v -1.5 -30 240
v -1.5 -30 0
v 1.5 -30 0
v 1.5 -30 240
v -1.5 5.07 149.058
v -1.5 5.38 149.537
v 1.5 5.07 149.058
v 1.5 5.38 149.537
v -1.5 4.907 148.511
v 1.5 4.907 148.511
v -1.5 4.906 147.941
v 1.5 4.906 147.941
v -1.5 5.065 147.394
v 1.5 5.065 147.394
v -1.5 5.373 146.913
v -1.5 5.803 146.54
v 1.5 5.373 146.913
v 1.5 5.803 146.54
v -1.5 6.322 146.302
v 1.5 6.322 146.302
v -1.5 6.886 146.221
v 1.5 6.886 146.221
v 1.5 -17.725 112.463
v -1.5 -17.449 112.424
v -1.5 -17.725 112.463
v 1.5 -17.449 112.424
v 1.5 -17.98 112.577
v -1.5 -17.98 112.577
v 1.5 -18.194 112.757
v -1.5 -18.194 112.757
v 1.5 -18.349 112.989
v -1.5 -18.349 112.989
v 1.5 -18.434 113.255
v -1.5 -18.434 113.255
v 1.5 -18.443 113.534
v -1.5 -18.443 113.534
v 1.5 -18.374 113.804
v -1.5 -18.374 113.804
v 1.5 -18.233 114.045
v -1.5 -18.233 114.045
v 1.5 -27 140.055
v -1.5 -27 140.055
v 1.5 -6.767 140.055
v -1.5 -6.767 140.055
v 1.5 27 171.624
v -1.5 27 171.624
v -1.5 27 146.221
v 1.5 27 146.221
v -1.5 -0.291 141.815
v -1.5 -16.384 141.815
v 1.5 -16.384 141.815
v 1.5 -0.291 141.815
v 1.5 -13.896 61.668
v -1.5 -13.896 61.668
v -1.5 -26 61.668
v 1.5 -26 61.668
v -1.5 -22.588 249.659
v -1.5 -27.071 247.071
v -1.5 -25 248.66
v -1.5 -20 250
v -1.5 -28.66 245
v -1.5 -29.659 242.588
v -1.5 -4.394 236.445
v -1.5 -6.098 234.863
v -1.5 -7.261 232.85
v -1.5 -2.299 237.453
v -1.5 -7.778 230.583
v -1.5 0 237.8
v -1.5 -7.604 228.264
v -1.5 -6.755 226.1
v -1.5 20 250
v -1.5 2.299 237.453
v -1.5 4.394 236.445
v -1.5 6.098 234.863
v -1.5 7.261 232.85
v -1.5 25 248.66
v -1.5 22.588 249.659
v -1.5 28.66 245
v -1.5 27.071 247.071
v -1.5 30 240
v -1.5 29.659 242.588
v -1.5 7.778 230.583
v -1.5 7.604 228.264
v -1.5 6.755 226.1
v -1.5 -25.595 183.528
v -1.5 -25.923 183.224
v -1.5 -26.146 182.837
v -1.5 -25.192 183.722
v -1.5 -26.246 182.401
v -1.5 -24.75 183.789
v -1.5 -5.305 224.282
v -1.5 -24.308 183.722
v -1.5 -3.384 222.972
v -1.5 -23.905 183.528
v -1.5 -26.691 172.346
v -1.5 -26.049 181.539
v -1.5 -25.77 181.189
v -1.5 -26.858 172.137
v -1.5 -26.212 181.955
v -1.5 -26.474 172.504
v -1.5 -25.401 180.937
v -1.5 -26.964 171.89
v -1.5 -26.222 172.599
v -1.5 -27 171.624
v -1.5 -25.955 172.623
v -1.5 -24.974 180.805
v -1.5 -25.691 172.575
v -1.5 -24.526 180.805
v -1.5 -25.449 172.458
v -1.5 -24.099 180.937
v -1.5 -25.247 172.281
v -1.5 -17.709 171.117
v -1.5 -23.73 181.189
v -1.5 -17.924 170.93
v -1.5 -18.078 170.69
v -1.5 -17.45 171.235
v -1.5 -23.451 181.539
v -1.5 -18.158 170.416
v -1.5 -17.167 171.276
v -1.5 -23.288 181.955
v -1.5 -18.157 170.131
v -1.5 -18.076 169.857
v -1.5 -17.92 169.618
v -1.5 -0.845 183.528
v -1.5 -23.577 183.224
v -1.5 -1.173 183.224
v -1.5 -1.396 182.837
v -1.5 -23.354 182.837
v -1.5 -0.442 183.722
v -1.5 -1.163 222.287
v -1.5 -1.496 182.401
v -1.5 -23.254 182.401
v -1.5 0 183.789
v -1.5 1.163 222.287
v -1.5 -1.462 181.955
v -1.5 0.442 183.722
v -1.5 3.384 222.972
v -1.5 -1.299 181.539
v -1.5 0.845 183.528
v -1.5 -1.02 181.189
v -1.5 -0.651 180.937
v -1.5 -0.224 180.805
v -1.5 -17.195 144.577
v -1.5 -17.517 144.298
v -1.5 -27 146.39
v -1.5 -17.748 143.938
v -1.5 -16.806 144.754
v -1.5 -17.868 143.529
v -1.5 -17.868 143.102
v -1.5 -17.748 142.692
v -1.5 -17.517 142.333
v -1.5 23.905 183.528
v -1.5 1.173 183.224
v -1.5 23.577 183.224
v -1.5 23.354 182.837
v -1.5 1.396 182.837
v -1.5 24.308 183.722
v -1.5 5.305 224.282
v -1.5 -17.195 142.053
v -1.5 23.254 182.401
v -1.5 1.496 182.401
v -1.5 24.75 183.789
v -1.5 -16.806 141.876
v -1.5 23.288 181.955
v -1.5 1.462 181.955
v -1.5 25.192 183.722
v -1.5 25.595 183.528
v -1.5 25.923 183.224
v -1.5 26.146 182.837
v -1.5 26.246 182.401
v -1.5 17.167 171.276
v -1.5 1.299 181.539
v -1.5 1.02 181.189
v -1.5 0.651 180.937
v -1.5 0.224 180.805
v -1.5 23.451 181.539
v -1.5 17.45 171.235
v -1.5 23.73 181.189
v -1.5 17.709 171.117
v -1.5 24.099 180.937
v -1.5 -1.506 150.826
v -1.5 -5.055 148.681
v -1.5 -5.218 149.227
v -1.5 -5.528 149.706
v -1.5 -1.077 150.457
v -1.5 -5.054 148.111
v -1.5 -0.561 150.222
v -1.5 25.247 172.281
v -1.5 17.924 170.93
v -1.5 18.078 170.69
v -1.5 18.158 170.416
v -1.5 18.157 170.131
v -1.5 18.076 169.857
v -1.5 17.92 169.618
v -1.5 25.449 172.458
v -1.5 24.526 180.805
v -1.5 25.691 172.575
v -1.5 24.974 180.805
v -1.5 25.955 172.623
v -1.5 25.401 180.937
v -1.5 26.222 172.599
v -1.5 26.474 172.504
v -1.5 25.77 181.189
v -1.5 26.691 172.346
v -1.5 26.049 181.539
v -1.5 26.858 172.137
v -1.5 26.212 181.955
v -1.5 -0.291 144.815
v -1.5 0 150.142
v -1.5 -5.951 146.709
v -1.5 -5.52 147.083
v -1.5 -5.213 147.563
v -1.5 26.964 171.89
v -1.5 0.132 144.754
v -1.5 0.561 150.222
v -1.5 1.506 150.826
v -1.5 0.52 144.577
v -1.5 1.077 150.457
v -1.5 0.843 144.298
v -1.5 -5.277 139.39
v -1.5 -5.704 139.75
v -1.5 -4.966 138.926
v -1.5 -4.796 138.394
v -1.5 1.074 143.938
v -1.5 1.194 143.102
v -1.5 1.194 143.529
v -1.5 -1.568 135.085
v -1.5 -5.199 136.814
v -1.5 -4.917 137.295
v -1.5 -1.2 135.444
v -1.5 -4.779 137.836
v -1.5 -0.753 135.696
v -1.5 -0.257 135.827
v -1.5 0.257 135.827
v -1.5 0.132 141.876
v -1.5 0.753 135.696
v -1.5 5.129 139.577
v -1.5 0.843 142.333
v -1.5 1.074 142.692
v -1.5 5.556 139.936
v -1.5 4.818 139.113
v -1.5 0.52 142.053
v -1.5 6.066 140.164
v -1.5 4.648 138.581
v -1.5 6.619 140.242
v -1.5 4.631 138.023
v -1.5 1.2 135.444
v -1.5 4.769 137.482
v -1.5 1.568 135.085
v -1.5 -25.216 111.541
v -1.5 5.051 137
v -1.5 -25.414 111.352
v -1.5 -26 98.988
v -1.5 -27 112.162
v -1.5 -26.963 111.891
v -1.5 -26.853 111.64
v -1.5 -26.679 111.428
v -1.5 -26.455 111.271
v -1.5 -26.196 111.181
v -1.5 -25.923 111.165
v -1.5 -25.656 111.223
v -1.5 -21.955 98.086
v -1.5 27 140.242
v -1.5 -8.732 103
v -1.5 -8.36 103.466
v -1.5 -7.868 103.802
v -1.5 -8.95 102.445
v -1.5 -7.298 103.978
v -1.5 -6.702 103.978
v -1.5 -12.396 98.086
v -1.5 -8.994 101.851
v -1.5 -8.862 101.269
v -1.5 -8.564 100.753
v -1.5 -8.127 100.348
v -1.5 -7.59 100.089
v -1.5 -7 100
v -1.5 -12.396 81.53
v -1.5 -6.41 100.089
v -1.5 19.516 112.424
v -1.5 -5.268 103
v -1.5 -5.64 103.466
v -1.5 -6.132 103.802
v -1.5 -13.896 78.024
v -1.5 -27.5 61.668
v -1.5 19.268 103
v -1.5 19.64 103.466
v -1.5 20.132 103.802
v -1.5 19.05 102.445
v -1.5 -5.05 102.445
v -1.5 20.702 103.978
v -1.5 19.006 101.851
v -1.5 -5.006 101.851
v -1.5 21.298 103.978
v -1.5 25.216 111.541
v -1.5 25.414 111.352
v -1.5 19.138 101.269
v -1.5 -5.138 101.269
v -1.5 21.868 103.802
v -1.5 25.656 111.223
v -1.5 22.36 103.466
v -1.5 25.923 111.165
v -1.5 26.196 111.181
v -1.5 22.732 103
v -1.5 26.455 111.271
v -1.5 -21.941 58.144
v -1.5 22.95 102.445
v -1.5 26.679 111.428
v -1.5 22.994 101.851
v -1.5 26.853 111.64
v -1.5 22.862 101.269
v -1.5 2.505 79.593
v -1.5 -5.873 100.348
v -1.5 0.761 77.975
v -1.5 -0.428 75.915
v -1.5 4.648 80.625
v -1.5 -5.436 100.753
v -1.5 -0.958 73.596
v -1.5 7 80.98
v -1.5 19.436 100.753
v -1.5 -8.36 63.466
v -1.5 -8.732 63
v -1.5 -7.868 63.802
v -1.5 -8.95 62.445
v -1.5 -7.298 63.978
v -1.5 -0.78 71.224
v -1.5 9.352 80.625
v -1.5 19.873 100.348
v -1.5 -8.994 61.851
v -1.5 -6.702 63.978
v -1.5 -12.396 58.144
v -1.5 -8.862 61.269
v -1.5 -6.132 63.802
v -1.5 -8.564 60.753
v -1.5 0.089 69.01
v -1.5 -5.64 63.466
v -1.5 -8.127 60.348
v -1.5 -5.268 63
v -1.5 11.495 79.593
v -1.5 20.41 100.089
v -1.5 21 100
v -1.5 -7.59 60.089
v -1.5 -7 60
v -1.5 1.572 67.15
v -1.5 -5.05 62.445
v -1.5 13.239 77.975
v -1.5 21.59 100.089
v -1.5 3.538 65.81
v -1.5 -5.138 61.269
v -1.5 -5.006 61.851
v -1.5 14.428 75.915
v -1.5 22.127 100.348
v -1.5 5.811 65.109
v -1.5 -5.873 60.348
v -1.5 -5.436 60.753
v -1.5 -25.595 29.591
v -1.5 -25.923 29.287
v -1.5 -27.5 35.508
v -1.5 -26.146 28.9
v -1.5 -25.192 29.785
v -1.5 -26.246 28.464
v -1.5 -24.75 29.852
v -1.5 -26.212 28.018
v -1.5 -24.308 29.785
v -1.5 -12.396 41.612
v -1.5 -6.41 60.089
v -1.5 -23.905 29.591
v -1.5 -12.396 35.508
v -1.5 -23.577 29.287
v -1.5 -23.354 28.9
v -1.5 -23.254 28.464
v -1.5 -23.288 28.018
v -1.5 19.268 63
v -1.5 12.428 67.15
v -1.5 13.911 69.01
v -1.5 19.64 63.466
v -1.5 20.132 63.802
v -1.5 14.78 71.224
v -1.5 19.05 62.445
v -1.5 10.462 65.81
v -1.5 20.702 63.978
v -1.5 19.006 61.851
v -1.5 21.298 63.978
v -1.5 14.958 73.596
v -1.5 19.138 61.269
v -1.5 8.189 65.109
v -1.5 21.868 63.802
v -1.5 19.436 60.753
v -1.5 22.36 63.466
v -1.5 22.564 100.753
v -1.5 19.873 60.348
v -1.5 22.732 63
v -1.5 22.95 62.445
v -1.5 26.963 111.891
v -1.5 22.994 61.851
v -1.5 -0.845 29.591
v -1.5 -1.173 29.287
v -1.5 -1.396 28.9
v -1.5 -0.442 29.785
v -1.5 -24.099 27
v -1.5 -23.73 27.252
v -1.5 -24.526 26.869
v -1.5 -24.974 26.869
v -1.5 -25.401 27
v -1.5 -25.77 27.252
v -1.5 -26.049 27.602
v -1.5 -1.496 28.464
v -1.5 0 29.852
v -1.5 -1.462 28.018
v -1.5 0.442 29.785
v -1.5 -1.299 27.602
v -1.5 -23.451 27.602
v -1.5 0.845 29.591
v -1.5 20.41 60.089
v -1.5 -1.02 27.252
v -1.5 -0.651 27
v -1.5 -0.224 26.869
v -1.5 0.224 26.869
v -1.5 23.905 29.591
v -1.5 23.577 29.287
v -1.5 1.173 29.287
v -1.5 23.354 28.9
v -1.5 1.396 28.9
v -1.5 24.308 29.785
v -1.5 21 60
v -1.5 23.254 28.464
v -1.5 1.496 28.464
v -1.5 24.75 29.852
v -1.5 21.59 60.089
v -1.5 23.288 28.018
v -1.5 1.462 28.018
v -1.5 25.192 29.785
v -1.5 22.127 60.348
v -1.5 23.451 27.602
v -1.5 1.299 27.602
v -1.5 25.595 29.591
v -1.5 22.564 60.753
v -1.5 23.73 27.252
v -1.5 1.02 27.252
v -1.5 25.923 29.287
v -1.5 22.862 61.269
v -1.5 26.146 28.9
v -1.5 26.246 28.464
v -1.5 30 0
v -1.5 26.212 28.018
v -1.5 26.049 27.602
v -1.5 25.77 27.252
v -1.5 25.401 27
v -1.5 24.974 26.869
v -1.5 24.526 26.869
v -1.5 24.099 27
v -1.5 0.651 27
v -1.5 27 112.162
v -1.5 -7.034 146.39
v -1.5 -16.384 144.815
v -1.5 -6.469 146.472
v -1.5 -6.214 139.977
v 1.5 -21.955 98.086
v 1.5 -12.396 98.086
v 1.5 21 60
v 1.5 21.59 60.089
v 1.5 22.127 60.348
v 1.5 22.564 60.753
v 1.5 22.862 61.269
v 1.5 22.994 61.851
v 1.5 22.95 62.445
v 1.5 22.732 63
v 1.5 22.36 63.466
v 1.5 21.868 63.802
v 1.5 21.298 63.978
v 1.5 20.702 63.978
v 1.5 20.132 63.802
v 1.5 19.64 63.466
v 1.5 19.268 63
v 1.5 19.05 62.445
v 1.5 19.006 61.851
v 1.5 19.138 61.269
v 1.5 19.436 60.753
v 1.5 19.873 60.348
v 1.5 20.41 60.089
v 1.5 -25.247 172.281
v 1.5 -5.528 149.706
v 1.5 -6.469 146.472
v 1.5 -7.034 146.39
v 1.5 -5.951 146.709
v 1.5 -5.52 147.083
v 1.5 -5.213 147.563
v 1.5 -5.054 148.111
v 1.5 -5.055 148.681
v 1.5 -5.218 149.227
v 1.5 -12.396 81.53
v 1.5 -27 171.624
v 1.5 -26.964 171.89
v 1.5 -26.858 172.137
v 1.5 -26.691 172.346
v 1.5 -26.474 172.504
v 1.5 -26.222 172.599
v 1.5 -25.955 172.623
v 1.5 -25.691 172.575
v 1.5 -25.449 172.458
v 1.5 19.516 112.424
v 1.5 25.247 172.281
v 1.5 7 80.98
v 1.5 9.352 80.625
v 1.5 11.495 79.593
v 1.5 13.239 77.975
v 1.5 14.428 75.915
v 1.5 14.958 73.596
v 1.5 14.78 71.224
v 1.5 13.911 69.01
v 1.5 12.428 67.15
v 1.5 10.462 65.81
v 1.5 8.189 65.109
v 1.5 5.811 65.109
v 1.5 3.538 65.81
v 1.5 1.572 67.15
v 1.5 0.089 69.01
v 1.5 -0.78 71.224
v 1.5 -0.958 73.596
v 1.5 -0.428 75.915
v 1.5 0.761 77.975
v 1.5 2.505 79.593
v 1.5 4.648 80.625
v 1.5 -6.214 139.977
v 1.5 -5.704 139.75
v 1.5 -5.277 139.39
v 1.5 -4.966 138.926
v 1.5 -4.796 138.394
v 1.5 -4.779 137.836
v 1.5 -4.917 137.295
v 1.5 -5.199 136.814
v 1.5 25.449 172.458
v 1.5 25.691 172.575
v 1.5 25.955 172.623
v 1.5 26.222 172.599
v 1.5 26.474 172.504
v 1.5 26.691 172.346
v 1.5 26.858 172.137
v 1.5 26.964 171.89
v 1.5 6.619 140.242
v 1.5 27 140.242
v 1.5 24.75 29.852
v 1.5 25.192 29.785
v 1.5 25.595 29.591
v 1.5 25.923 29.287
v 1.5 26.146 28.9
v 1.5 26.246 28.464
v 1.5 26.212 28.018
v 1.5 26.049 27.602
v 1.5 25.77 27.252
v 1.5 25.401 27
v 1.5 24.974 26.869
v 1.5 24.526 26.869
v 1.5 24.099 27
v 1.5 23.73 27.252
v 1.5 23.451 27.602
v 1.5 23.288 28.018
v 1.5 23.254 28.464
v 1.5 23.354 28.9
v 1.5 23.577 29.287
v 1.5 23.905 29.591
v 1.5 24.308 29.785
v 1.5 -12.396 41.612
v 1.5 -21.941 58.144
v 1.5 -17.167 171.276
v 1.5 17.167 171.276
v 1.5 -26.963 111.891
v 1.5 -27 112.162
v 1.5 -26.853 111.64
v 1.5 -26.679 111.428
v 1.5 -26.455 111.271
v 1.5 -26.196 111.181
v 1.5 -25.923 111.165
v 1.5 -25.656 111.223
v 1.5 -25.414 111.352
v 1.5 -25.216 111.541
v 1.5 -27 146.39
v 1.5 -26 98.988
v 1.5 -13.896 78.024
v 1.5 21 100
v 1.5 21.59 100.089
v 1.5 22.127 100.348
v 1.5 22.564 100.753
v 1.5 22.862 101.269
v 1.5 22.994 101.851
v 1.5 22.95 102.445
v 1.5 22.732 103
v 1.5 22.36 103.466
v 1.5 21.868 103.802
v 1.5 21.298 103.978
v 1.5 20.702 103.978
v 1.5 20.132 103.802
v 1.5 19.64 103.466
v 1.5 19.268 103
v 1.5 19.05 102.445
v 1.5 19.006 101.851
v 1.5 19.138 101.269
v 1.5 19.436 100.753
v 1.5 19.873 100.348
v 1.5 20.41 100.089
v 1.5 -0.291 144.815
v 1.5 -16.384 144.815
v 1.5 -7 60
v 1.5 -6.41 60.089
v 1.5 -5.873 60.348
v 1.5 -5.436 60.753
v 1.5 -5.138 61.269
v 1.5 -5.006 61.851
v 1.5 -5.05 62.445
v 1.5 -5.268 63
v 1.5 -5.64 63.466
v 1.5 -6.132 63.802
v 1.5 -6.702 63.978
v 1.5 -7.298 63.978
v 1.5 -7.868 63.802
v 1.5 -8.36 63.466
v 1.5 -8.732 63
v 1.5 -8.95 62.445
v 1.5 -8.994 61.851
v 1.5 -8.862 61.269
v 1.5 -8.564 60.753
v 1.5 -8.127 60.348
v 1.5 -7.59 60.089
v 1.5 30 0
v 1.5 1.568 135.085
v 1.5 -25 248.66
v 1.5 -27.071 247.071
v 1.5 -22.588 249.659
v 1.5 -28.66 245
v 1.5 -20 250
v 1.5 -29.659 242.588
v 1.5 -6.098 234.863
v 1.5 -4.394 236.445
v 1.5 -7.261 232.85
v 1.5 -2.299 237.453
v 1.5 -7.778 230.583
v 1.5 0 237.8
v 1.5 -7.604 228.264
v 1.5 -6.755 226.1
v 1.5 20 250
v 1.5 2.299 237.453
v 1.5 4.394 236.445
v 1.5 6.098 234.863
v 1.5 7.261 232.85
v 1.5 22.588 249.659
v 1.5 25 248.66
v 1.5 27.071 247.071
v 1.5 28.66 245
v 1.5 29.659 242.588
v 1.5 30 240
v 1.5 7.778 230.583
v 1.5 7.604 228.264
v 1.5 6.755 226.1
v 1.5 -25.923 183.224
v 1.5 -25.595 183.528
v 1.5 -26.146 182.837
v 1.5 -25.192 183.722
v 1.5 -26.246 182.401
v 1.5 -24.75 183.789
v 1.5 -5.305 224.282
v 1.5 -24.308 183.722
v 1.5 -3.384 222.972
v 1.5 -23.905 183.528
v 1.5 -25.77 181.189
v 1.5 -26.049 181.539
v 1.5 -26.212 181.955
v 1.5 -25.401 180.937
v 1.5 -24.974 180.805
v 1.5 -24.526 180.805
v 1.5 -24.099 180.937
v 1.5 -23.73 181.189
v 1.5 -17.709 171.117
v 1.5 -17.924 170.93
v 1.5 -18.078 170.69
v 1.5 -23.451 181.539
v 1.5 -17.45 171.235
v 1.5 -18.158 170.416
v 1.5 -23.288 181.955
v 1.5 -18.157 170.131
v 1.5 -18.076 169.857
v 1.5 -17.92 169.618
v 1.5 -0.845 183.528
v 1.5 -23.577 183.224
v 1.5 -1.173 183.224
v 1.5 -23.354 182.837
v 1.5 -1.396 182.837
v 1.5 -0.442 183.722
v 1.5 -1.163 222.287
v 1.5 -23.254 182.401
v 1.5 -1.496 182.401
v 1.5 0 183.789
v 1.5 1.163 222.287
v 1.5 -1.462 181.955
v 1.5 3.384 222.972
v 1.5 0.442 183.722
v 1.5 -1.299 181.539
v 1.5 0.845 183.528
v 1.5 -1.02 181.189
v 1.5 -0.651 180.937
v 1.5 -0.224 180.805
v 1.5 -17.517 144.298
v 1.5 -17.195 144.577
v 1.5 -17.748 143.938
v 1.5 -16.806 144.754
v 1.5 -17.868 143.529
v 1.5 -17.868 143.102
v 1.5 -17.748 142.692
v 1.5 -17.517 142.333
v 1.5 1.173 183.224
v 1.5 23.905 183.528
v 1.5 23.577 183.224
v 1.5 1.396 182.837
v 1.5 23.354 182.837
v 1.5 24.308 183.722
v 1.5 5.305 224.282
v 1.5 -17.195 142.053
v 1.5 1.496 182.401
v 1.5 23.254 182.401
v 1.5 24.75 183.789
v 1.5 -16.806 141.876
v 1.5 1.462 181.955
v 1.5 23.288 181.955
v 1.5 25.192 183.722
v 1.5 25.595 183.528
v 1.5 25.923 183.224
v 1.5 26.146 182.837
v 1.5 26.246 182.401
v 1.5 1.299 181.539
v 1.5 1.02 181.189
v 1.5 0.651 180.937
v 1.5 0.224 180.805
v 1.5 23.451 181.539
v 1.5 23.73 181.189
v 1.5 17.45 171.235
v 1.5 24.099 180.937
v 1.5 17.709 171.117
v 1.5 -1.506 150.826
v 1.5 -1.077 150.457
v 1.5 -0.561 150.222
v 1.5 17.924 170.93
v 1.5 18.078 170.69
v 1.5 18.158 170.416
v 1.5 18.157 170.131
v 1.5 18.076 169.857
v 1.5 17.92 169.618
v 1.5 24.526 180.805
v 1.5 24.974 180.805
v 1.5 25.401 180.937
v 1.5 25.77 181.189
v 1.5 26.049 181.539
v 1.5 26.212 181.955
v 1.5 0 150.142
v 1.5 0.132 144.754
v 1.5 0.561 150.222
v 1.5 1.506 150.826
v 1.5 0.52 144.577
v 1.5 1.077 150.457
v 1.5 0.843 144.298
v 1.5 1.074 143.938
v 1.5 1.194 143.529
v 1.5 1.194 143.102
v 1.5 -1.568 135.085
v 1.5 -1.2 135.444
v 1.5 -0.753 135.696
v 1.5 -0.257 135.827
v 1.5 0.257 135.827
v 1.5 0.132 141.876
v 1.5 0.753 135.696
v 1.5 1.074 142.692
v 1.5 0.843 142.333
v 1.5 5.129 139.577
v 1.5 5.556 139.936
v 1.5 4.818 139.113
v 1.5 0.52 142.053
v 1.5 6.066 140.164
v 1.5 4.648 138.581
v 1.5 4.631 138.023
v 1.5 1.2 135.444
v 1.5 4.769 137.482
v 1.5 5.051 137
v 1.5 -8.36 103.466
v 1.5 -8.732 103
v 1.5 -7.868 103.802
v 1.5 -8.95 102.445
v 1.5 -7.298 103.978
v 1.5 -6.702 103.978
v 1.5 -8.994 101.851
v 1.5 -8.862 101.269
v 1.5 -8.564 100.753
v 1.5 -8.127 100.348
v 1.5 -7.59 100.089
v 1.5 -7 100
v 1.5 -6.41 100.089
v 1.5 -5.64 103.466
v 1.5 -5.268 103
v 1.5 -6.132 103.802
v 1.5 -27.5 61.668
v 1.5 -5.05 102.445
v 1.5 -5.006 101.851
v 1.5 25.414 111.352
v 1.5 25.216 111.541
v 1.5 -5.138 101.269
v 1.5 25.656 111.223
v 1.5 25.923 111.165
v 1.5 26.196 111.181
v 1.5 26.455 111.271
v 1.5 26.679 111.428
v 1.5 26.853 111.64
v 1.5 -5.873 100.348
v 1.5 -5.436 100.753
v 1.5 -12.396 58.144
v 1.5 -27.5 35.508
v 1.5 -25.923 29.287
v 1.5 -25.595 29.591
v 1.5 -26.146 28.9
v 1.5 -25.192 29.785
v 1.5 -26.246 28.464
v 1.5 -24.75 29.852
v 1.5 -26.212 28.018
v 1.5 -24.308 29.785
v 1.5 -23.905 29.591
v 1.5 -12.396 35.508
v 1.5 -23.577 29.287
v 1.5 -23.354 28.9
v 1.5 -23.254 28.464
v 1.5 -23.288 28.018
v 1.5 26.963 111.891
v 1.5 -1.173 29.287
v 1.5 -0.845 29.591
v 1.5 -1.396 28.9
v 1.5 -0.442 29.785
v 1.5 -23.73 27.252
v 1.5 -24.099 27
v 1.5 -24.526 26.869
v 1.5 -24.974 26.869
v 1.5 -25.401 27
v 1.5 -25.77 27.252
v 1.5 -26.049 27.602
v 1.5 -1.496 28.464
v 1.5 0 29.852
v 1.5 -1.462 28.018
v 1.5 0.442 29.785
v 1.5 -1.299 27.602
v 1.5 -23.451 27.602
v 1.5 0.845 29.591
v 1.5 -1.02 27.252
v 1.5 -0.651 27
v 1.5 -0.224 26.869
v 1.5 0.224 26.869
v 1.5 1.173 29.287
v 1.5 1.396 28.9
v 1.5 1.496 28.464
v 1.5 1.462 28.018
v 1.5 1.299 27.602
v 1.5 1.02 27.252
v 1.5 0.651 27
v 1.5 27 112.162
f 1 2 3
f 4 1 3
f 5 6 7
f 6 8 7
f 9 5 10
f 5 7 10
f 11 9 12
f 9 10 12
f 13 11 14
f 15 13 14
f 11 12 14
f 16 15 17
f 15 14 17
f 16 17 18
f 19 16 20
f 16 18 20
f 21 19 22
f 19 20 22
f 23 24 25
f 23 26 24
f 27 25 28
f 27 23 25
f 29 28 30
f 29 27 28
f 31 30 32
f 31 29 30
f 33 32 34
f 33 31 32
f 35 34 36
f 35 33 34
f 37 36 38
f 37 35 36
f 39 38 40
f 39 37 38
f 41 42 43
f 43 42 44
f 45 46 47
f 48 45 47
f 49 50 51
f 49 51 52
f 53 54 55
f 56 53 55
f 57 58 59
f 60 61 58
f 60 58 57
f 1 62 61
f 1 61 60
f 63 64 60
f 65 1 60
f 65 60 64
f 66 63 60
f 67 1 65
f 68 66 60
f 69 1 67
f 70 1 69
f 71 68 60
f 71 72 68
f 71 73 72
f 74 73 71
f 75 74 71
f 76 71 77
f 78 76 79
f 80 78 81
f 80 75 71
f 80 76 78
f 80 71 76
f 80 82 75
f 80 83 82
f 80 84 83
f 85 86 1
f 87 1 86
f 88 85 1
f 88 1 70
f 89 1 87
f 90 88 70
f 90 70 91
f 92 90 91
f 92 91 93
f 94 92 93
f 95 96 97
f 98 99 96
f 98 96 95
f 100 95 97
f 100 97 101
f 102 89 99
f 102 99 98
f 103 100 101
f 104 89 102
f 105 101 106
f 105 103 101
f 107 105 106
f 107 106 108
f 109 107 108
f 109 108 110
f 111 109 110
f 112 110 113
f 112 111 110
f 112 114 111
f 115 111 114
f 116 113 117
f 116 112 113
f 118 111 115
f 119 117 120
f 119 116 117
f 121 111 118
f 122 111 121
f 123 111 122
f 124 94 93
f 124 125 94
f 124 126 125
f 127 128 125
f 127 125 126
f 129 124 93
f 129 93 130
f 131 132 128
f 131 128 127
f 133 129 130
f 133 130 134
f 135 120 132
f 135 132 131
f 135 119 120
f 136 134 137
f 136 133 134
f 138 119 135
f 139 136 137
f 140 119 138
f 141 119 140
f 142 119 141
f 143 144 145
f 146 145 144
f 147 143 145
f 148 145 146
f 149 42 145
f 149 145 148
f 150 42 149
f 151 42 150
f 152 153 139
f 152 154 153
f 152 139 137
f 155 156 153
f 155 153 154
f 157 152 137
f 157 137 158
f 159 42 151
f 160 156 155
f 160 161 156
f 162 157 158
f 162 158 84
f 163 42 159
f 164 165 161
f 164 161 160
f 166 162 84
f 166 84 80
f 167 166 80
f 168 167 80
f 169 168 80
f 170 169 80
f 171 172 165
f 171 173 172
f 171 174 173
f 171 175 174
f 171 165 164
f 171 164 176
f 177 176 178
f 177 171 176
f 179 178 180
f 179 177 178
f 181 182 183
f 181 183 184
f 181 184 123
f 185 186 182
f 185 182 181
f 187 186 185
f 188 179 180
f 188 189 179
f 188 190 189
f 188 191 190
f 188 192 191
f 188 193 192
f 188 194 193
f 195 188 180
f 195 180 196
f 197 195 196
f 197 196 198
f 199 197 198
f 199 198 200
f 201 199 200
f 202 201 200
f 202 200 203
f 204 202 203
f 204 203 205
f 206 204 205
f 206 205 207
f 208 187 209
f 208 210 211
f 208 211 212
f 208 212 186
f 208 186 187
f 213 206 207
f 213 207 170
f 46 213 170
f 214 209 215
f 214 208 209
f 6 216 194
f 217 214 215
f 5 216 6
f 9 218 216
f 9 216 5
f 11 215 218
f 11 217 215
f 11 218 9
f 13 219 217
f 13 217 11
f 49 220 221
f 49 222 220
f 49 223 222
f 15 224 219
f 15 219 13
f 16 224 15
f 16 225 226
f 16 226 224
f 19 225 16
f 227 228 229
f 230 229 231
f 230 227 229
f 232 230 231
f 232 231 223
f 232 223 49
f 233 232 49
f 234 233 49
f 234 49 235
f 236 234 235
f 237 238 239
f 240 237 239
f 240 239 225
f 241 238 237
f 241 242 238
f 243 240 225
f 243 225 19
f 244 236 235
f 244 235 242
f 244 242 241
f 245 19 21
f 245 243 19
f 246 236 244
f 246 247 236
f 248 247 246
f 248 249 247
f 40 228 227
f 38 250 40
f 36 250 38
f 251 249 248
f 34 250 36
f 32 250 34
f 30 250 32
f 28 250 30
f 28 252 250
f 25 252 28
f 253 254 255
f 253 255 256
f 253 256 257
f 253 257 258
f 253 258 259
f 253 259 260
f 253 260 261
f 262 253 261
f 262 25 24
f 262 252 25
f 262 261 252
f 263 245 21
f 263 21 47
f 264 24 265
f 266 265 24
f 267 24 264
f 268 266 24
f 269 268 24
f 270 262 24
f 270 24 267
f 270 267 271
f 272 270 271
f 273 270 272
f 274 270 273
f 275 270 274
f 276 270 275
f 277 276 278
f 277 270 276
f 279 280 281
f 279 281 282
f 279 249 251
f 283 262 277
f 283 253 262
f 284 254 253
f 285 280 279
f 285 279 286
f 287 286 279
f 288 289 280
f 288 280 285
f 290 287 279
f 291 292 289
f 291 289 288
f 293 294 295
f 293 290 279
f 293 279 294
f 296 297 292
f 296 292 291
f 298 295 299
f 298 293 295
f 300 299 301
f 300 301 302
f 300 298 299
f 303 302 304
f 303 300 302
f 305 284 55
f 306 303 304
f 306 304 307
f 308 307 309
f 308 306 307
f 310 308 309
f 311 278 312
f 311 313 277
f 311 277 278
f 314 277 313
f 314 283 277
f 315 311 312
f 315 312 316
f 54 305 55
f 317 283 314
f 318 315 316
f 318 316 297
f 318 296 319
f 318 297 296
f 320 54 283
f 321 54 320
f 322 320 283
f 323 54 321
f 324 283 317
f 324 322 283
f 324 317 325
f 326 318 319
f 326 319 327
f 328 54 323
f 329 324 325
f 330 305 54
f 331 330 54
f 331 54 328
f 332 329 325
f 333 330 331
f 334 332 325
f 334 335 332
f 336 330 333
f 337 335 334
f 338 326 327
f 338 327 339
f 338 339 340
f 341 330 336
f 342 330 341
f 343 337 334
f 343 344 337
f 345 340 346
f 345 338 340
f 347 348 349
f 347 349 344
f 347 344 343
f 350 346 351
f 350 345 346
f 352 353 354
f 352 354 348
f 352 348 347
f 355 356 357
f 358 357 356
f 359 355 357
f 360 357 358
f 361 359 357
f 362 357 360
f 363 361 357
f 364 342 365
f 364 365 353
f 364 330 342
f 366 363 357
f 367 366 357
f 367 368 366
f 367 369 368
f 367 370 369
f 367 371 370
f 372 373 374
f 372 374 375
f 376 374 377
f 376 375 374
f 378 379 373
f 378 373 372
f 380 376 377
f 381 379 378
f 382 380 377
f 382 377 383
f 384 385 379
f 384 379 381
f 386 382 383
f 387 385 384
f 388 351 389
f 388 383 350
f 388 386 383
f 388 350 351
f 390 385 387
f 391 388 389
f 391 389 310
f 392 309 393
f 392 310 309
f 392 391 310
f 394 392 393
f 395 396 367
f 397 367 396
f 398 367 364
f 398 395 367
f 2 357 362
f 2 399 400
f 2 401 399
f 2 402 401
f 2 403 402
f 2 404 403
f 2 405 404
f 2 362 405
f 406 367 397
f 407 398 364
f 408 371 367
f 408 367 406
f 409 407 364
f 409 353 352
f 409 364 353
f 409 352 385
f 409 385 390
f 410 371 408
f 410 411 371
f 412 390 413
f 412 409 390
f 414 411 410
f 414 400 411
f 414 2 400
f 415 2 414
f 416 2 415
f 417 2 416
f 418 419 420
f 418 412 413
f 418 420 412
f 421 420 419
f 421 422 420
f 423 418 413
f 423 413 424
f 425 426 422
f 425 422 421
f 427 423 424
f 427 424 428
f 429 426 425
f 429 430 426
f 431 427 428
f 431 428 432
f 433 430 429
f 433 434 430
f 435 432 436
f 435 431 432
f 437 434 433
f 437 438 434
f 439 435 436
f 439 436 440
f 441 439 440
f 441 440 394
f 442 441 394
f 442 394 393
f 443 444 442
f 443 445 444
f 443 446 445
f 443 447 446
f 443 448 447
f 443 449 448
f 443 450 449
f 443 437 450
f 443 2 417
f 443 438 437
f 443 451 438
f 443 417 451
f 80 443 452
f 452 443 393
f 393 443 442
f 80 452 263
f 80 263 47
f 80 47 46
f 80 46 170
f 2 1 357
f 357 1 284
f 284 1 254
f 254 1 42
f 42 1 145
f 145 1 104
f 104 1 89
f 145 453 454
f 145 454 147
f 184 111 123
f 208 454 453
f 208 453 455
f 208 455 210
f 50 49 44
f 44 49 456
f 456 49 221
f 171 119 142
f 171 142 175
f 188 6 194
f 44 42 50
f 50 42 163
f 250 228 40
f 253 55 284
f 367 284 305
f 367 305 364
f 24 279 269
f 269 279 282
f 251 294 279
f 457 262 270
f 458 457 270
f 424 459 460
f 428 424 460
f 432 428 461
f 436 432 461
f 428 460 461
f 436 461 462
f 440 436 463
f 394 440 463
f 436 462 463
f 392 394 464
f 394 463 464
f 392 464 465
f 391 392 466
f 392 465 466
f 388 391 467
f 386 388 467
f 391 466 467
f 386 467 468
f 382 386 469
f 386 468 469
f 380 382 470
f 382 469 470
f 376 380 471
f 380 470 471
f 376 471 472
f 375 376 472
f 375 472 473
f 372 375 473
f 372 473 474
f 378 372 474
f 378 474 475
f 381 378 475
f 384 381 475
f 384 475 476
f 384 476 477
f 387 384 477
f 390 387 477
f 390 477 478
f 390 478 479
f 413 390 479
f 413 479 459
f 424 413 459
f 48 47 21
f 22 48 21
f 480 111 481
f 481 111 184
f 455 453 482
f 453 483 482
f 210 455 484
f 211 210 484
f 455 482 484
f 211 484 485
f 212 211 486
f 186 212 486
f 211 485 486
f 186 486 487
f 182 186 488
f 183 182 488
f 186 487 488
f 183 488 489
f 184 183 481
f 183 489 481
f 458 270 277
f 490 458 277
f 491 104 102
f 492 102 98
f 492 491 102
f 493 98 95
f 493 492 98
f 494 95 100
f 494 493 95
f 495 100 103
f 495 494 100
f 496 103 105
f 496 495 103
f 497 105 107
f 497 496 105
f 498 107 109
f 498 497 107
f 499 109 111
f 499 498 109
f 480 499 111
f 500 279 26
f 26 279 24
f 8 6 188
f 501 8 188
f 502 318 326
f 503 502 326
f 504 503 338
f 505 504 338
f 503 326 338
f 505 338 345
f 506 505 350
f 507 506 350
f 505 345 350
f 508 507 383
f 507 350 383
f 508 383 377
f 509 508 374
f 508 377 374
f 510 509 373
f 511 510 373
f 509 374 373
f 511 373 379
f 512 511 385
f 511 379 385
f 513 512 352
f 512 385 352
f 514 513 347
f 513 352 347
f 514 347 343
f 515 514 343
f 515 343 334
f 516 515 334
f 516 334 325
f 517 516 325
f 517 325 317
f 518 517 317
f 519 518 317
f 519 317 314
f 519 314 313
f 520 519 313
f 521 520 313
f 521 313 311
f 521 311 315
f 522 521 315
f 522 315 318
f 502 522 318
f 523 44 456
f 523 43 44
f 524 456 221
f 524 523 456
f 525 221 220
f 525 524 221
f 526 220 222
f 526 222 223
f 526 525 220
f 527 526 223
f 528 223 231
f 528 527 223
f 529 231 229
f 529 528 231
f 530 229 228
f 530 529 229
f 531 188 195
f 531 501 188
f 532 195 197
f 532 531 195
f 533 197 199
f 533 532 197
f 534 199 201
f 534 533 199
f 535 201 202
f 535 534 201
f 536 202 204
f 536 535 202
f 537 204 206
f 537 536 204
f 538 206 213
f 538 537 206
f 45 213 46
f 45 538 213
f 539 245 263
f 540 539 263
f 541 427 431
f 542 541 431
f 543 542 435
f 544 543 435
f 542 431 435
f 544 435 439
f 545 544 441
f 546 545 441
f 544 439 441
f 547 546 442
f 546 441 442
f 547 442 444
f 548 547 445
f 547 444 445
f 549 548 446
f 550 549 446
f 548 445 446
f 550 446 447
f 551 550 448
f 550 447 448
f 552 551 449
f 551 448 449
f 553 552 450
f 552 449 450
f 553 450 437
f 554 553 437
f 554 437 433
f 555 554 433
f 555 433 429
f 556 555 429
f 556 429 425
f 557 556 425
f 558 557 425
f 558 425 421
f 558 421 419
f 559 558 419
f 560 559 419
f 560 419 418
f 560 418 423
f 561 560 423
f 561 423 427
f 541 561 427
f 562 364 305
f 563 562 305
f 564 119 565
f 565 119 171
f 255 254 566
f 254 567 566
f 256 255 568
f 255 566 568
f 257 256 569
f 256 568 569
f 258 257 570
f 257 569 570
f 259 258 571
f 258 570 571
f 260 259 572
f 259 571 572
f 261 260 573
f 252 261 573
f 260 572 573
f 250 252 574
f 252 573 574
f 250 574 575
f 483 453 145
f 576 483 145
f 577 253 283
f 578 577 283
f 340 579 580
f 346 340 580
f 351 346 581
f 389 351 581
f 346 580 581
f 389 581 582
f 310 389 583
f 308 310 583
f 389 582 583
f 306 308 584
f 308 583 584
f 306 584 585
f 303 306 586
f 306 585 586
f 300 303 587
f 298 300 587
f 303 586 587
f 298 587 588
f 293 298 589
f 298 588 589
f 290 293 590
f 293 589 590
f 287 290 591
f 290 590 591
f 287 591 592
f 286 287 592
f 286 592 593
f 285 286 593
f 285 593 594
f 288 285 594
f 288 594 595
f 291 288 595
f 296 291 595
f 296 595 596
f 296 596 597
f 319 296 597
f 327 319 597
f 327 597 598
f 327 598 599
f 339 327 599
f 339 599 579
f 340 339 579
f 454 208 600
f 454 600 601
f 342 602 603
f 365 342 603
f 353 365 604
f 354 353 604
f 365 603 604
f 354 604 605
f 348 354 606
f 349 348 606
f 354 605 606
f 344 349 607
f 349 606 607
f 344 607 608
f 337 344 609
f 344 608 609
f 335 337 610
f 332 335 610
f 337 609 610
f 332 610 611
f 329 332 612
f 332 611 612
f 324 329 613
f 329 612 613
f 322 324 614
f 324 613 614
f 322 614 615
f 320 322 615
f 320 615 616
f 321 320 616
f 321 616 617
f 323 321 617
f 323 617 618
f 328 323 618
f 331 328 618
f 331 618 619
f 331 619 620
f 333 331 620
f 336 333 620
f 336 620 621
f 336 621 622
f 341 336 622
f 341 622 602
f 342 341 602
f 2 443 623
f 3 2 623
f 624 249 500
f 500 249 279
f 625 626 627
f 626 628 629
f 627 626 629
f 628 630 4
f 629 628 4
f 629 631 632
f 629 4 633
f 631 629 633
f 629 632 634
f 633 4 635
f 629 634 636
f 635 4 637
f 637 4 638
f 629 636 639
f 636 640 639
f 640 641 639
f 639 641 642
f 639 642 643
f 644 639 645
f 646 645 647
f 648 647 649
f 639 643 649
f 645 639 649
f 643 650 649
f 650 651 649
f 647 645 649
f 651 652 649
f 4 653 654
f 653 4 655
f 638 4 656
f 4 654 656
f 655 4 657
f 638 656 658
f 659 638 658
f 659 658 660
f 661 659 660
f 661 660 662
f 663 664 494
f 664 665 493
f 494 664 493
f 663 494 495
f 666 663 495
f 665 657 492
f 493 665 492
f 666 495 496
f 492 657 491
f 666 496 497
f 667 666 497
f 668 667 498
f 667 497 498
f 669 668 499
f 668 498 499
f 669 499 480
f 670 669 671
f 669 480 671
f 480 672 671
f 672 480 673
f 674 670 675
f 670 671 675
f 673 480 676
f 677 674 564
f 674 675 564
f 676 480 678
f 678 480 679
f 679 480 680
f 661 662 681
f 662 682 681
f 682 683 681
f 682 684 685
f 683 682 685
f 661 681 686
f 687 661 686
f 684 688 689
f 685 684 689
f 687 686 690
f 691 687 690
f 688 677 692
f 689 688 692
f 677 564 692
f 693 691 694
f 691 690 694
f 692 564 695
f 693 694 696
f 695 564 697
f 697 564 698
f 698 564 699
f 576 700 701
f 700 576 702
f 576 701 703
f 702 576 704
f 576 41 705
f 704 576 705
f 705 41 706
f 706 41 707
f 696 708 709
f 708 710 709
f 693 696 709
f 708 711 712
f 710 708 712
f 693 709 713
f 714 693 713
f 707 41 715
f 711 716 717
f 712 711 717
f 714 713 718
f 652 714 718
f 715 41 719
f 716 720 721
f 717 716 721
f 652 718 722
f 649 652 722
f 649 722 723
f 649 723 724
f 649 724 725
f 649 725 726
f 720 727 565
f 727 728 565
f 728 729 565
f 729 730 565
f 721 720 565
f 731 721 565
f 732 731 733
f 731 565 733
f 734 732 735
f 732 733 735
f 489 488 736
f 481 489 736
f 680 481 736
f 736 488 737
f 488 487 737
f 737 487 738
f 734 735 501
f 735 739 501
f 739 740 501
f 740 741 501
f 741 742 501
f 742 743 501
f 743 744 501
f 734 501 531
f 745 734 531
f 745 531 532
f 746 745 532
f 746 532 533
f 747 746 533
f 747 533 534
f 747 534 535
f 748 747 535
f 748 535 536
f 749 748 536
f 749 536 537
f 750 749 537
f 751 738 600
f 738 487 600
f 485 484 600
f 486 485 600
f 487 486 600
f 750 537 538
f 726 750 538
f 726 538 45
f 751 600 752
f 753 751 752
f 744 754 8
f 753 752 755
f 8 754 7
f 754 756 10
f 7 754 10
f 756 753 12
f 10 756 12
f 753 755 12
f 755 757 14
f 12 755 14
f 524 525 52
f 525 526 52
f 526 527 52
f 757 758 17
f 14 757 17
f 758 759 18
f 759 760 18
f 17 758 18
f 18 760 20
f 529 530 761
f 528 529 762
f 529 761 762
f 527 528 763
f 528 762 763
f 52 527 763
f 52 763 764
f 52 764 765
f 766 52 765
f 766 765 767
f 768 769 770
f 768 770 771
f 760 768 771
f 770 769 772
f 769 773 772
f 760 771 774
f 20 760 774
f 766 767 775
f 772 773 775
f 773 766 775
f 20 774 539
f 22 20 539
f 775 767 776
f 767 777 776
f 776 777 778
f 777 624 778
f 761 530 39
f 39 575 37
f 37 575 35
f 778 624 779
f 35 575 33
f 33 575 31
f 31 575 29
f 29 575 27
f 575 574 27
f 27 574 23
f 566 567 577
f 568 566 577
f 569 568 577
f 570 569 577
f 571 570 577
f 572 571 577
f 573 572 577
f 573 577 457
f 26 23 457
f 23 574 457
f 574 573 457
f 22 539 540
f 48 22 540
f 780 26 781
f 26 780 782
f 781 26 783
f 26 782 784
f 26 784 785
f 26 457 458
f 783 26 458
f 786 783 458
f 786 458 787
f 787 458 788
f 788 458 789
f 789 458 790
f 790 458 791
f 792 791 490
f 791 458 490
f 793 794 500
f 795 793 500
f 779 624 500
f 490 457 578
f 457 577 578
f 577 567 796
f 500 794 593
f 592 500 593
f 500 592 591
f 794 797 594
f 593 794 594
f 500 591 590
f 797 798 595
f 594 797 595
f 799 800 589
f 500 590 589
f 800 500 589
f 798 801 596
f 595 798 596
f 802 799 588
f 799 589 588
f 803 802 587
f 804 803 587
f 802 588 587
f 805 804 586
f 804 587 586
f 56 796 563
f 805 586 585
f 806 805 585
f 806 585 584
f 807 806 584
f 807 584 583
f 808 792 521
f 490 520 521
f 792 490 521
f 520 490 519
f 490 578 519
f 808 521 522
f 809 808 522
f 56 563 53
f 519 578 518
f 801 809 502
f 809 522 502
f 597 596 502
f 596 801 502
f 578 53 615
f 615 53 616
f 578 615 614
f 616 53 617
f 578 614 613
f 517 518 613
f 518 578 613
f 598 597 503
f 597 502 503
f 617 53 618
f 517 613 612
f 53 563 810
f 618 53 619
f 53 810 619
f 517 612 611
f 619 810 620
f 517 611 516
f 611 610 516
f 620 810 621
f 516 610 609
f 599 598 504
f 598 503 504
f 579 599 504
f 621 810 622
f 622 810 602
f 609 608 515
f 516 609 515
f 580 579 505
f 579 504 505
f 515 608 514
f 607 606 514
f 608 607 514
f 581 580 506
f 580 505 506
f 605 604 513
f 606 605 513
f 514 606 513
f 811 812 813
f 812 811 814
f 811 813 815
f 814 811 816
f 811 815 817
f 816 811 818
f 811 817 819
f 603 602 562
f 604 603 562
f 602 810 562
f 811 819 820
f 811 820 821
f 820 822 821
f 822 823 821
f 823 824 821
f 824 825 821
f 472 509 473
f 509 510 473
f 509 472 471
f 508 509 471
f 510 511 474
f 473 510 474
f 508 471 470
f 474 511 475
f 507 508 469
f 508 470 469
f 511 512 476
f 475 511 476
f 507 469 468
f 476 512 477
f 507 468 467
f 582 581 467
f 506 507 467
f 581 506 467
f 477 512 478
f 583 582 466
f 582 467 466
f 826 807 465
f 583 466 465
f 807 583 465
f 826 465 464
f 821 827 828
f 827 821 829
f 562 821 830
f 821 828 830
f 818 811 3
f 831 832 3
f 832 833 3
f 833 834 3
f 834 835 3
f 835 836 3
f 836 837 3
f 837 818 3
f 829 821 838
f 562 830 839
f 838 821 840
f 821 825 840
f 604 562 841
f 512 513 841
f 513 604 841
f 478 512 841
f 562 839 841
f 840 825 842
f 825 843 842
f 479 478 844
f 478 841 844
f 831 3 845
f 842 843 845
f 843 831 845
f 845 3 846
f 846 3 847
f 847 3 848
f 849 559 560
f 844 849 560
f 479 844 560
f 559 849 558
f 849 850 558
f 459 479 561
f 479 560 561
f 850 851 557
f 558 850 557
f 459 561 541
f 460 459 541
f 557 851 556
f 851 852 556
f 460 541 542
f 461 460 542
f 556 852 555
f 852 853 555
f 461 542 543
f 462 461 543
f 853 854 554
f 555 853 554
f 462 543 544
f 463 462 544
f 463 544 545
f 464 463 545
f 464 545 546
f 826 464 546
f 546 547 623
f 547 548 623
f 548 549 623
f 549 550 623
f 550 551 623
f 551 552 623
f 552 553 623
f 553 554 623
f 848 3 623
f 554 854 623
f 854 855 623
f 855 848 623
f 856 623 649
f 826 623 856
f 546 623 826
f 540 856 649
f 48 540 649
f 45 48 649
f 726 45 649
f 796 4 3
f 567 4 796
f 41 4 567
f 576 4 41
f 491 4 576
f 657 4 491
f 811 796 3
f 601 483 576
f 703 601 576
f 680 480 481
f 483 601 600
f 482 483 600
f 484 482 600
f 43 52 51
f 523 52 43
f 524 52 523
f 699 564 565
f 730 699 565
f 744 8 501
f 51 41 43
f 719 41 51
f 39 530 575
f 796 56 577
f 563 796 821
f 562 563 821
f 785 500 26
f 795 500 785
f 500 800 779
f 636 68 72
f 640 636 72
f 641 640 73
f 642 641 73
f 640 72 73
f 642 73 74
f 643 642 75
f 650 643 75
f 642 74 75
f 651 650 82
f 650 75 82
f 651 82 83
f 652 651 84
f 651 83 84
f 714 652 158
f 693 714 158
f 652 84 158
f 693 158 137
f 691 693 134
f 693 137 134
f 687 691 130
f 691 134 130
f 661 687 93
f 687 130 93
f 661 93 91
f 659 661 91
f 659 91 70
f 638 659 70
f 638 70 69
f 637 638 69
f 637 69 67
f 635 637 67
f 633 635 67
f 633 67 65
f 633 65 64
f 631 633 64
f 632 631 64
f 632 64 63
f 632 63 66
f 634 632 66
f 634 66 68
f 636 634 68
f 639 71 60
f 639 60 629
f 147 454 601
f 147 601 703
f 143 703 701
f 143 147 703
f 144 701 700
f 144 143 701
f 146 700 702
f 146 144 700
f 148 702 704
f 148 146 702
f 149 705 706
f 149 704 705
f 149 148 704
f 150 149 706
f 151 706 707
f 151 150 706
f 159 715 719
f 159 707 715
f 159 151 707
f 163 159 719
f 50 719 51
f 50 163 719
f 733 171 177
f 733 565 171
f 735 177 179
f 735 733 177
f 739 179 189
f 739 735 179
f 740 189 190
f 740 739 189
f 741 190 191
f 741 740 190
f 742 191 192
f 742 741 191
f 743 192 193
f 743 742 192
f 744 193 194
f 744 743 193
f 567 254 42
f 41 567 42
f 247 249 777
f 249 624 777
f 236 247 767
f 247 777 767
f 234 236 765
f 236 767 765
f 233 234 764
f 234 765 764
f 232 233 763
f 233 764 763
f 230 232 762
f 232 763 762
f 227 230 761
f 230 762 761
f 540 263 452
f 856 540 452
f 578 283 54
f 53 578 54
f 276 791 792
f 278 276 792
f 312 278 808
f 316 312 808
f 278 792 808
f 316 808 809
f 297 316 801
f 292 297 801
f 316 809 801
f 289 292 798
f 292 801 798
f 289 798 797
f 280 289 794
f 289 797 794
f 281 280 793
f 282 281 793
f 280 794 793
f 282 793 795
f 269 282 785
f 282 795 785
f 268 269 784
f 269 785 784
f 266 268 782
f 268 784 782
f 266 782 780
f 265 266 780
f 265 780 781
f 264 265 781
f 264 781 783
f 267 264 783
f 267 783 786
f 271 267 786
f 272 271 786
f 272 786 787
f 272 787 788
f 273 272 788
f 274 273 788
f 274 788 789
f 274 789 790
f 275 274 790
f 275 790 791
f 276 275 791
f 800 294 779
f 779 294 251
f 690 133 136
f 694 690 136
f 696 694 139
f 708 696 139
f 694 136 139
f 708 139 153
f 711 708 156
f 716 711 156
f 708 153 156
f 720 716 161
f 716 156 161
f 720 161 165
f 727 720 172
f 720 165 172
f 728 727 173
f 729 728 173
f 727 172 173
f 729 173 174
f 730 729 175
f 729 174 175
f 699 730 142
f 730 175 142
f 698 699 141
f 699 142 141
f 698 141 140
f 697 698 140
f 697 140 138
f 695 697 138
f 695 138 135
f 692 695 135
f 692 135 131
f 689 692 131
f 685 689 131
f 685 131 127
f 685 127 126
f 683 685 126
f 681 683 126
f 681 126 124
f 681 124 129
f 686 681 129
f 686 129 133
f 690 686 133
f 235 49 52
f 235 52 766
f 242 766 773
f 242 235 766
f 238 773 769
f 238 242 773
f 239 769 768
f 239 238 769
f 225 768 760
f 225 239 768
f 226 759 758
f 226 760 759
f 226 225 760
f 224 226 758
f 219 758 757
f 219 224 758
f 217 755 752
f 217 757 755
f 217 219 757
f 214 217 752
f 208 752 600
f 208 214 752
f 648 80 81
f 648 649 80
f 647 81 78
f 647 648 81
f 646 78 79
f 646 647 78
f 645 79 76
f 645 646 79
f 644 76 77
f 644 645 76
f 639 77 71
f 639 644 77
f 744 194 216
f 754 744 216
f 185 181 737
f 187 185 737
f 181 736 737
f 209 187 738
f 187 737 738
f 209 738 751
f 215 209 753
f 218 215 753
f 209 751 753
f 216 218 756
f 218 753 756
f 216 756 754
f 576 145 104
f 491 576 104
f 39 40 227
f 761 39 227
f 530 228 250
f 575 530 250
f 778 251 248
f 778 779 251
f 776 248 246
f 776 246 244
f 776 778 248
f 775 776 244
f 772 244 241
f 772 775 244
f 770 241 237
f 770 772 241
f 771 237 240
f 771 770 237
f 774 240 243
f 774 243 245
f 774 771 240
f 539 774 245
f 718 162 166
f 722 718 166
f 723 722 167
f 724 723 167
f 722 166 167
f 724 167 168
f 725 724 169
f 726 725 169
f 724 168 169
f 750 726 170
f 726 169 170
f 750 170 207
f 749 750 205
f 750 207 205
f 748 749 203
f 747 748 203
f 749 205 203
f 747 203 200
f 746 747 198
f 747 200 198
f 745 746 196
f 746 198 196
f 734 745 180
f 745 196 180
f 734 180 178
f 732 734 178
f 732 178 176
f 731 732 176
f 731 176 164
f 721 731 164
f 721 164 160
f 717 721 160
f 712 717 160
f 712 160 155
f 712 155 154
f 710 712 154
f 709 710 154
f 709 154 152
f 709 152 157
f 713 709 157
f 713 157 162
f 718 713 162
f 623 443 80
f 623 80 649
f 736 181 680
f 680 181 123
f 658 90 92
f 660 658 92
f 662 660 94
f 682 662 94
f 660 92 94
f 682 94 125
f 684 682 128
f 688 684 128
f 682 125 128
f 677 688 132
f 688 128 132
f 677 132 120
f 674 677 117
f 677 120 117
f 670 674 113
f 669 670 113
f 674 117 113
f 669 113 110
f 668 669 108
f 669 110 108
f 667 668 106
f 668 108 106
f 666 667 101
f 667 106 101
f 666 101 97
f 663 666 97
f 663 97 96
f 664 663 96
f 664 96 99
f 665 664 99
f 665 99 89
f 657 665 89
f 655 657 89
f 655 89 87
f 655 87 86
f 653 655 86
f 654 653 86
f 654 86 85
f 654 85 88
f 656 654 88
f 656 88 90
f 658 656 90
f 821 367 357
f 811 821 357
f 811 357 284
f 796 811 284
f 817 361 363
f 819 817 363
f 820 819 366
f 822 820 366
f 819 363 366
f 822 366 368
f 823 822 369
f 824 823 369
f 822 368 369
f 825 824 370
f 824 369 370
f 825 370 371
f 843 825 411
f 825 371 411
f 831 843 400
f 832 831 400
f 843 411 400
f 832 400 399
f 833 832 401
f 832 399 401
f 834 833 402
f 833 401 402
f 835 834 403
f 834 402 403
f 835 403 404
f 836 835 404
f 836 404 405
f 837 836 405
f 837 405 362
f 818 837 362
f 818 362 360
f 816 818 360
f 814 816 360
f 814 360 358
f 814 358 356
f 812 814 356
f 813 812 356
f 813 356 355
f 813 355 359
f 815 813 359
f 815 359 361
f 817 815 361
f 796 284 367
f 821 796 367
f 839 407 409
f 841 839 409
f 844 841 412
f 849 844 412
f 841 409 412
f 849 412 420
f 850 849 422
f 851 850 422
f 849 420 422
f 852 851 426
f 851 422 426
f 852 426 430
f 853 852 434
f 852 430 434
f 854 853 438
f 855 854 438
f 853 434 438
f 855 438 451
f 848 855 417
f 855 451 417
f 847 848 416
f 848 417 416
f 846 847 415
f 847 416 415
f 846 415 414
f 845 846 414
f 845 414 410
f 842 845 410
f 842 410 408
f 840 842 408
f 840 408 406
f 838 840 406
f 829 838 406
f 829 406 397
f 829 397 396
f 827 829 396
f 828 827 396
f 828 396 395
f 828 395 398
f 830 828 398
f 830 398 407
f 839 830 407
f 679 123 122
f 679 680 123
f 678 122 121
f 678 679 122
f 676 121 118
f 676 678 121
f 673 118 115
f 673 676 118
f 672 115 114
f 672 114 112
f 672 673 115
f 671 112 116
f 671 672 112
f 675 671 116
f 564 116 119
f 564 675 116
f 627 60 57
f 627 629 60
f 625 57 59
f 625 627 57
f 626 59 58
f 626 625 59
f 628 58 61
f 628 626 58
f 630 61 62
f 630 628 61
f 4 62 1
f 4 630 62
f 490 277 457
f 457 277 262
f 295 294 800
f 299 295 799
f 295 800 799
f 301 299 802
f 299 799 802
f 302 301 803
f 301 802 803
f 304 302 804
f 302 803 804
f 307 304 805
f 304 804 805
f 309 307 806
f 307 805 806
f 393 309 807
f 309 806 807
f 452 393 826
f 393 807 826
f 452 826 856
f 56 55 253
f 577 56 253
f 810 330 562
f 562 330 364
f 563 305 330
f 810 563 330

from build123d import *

# Parameters (mm, degrees)
SKETCH1_W           = 3
SKETCH1_H           = 60
BOSS_EXTRUDE1_DEPTH = 250
FILLET1_R           = 10
FILLET2_R           = 10
SKETCH2_R           = 4.25
CUT_EXTRUDE1_DEPTH  = 4
SKETCH5_R           = 7.8
CUT_EXTRUDE4_DEPTH  = 4
SKETCH13_R          = 7.98
CUT_EXTRUDE10_DEPTH = 4
SKETCH14_R          = 2
CUT_EXTRUDE11_DEPTH = 4
CUT_EXTRUDE14_DEPTH = 10
FILLET3_R           = 1
FILLET4_R           = 2
CUT_EXTRUDE18_DEPTH = 10
CUT_EXTRUDE19_DEPTH = 4
SKETCH20_R          = 1.499999993
SKETCH20_R_2        = 1.5
CUT_EXTRUDE20_DEPTH = 4


with BuildPart() as part:
    # Sketch1 → Boss-Extrude1 (new body)
    with BuildSketch(Plane.XY):
        Rectangle(SKETCH1_W, SKETCH1_H)
    extrude(amount=BOSS_EXTRUDE1_DEPTH)

    # Fillet1
    fillet1_edges = [part.edges().sort_by_distance(p)[0] for p in [
        (0, 30, 250),
    ]]
    fillet(fillet1_edges, radius=FILLET1_R)

    # Fillet2
    fillet2_edges = [part.edges().sort_by_distance(p)[0] for p in [
        (0, -30, 250),
    ]]
    fillet(fillet2_edges, radius=FILLET2_R)

    # Sketch2 → Cut-Extrude1 (cut, through all)
    with BuildSketch(Plane.ZY.offset(1.5)):
        with Locations((230, 0)):
            Circle(SKETCH2_R)
    extrude(amount=-CUT_EXTRUDE1_DEPTH, mode=Mode.SUBTRACT)

    # Sketch5 → Cut-Extrude4 (cut, through all)
    with BuildSketch(Plane.ZY.offset(1.5)):
        with Locations((230, 0)):
            Circle(SKETCH5_R)
    extrude(amount=-CUT_EXTRUDE4_DEPTH, mode=Mode.SUBTRACT)

    # Sketch13 → Cut-Extrude10 (cut, through all)
    with BuildSketch(Plane.ZY.offset(1.5)):
        with Locations((73, 7)):
            Circle(SKETCH13_R)
    extrude(amount=-CUT_EXTRUDE10_DEPTH, mode=Mode.SUBTRACT)

    # Sketch14 → Cut-Extrude11 (cut, through all)
    with BuildSketch(Plane(origin=(1.5, 0, 0), x_dir=(0, 0, -1), z_dir=(1, 0, 0))):
        with Locations((-102, -7)):
            Circle(SKETCH14_R)
        with Locations((-102, 21)):
            Circle(SKETCH14_R)
        with Locations((-62, 21)):
            Circle(SKETCH14_R)
        with Locations((-62, -7)):
            Circle(SKETCH14_R)
    extrude(amount=-CUT_EXTRUDE11_DEPTH, mode=Mode.SUBTRACT)

    # Sketch17 → Cut-Extrude14 (cut)
    with BuildSketch(Plane.ZY.offset(1.5)):
        Polygon((149.1019184, 0), (171.275987572, -19.368578167), (171.275987572, 19.368578167), align=None)
        Polygon((146.3902575, -27), (174.288564399, -27), (146.3902575, -2.631421833), align=None)
        Polygon((109.288564399, -27), (140.055353087, -27), (140.055353087, -2.631421833), align=None)
        Polygon((112.424175394, 19.516465485), (112.424175394, -19.516465485), (137.064881363, 0), align=None)
        Polygon((109.288564399, 27), (140.242069678, 2.483534515), (140.242069678, 27), align=None)
        Polygon((146.220949067, 2.483534515), (174.288564399, 27), (146.220949067, 27), align=None)
    extrude(amount=-CUT_EXTRUDE14_DEPTH, mode=Mode.SUBTRACT)

    # Fillet3
    fillet3_edges = [part.edges().sort_by_distance(p)[0] for p in [
        (0, -27, 174.288564399),
        (0, 27, 174.288564399),
        (0, -19.368578167, 171.275987572),
        (0, 19.368578167, 171.275987572),
        (0, -19.516465485, 112.424175394),
        (0, 27, 109.288564399),
        (0, -27, 109.288564399),
    ]]
    fillet(fillet3_edges, radius=FILLET3_R)

    # Fillet4
    fillet4_edges = [part.edges().sort_by_distance(p)[0] for p in [
        (0, -2.631421833, 146.3902575),
        (0, 2.483534515, 146.220949067),
        (0, 0, 149.1019184),
        (0, 0, 137.064881363),
        (0, 2.483534515, 140.242069678),
        (0, -2.631421833, 140.055353087),
    ]]
    fillet(fillet4_edges, radius=FILLET4_R)

    # Sketch18 → Cut-Extrude18 (cut)
    with BuildSketch(Plane.ZY.offset(1.5)):
        Polygon((61.668054604, -26), (98.988380185, -26), (78.023904982, -13.896154598), (61.668054604, -13.896154598), align=None)
        Polygon((98.086456396, -21.955043464), (98.086456396, -12.396154598), (81.529975217, -12.396154598), align=None)
        Polygon((58.14382401, -12.396154598), (41.612161756, -12.396154598), (58.14382401, -21.940994237), align=None)
        Polygon((35.508194368, -27.5), (61.668054604, -27.5), (35.508194368, -12.396154598), align=None)
    extrude(amount=-CUT_EXTRUDE18_DEPTH, mode=Mode.SUBTRACT)

    # Sketch19 → Cut-Extrude19 (cut, through all)
    with BuildSketch(Plane.ZY.offset(1.5)):
        with BuildLine():
            Line((144.8152575, -0.290513908), (144.8152575, -16.383557477))
            ThreePointArc((144.8152575, -16.383557477), (143.3152575, -17.883557477), (141.8152575, -16.383557477))
            Line((141.8152575, -16.383557477), (141.8152575, -0.290513908))
            ThreePointArc((141.8152575, -0.290513908), (143.3152575, 1.209486092), (144.8152575, -0.290513908))
        make_face()
    extrude(amount=-CUT_EXTRUDE19_DEPTH, mode=Mode.SUBTRACT)

    # Sketch20 → Cut-Extrude20 (cut, through all)
    with BuildSketch(Plane.ZY.offset(1.5)):
        with Locations((28.351822222, -24.750000002)):
            Circle(SKETCH20_R)
        with Locations((28.351822222, -2e-09)):
            Circle(SKETCH20_R)
        with Locations((28.351822222, 24.749999998)):
            Circle(SKETCH20_R)
        with Locations((182.288564399, -24.750000007)):
            Circle(SKETCH20_R_2)
        with Locations((182.288564399, -7e-09)):
            Circle(SKETCH20_R_2)
        with Locations((182.288564399, 24.749999993)):
            Circle(SKETCH20_R_2)
    extrude(amount=-CUT_EXTRUDE20_DEPTH, mode=Mode.SUBTRACT)


solid = part.part
